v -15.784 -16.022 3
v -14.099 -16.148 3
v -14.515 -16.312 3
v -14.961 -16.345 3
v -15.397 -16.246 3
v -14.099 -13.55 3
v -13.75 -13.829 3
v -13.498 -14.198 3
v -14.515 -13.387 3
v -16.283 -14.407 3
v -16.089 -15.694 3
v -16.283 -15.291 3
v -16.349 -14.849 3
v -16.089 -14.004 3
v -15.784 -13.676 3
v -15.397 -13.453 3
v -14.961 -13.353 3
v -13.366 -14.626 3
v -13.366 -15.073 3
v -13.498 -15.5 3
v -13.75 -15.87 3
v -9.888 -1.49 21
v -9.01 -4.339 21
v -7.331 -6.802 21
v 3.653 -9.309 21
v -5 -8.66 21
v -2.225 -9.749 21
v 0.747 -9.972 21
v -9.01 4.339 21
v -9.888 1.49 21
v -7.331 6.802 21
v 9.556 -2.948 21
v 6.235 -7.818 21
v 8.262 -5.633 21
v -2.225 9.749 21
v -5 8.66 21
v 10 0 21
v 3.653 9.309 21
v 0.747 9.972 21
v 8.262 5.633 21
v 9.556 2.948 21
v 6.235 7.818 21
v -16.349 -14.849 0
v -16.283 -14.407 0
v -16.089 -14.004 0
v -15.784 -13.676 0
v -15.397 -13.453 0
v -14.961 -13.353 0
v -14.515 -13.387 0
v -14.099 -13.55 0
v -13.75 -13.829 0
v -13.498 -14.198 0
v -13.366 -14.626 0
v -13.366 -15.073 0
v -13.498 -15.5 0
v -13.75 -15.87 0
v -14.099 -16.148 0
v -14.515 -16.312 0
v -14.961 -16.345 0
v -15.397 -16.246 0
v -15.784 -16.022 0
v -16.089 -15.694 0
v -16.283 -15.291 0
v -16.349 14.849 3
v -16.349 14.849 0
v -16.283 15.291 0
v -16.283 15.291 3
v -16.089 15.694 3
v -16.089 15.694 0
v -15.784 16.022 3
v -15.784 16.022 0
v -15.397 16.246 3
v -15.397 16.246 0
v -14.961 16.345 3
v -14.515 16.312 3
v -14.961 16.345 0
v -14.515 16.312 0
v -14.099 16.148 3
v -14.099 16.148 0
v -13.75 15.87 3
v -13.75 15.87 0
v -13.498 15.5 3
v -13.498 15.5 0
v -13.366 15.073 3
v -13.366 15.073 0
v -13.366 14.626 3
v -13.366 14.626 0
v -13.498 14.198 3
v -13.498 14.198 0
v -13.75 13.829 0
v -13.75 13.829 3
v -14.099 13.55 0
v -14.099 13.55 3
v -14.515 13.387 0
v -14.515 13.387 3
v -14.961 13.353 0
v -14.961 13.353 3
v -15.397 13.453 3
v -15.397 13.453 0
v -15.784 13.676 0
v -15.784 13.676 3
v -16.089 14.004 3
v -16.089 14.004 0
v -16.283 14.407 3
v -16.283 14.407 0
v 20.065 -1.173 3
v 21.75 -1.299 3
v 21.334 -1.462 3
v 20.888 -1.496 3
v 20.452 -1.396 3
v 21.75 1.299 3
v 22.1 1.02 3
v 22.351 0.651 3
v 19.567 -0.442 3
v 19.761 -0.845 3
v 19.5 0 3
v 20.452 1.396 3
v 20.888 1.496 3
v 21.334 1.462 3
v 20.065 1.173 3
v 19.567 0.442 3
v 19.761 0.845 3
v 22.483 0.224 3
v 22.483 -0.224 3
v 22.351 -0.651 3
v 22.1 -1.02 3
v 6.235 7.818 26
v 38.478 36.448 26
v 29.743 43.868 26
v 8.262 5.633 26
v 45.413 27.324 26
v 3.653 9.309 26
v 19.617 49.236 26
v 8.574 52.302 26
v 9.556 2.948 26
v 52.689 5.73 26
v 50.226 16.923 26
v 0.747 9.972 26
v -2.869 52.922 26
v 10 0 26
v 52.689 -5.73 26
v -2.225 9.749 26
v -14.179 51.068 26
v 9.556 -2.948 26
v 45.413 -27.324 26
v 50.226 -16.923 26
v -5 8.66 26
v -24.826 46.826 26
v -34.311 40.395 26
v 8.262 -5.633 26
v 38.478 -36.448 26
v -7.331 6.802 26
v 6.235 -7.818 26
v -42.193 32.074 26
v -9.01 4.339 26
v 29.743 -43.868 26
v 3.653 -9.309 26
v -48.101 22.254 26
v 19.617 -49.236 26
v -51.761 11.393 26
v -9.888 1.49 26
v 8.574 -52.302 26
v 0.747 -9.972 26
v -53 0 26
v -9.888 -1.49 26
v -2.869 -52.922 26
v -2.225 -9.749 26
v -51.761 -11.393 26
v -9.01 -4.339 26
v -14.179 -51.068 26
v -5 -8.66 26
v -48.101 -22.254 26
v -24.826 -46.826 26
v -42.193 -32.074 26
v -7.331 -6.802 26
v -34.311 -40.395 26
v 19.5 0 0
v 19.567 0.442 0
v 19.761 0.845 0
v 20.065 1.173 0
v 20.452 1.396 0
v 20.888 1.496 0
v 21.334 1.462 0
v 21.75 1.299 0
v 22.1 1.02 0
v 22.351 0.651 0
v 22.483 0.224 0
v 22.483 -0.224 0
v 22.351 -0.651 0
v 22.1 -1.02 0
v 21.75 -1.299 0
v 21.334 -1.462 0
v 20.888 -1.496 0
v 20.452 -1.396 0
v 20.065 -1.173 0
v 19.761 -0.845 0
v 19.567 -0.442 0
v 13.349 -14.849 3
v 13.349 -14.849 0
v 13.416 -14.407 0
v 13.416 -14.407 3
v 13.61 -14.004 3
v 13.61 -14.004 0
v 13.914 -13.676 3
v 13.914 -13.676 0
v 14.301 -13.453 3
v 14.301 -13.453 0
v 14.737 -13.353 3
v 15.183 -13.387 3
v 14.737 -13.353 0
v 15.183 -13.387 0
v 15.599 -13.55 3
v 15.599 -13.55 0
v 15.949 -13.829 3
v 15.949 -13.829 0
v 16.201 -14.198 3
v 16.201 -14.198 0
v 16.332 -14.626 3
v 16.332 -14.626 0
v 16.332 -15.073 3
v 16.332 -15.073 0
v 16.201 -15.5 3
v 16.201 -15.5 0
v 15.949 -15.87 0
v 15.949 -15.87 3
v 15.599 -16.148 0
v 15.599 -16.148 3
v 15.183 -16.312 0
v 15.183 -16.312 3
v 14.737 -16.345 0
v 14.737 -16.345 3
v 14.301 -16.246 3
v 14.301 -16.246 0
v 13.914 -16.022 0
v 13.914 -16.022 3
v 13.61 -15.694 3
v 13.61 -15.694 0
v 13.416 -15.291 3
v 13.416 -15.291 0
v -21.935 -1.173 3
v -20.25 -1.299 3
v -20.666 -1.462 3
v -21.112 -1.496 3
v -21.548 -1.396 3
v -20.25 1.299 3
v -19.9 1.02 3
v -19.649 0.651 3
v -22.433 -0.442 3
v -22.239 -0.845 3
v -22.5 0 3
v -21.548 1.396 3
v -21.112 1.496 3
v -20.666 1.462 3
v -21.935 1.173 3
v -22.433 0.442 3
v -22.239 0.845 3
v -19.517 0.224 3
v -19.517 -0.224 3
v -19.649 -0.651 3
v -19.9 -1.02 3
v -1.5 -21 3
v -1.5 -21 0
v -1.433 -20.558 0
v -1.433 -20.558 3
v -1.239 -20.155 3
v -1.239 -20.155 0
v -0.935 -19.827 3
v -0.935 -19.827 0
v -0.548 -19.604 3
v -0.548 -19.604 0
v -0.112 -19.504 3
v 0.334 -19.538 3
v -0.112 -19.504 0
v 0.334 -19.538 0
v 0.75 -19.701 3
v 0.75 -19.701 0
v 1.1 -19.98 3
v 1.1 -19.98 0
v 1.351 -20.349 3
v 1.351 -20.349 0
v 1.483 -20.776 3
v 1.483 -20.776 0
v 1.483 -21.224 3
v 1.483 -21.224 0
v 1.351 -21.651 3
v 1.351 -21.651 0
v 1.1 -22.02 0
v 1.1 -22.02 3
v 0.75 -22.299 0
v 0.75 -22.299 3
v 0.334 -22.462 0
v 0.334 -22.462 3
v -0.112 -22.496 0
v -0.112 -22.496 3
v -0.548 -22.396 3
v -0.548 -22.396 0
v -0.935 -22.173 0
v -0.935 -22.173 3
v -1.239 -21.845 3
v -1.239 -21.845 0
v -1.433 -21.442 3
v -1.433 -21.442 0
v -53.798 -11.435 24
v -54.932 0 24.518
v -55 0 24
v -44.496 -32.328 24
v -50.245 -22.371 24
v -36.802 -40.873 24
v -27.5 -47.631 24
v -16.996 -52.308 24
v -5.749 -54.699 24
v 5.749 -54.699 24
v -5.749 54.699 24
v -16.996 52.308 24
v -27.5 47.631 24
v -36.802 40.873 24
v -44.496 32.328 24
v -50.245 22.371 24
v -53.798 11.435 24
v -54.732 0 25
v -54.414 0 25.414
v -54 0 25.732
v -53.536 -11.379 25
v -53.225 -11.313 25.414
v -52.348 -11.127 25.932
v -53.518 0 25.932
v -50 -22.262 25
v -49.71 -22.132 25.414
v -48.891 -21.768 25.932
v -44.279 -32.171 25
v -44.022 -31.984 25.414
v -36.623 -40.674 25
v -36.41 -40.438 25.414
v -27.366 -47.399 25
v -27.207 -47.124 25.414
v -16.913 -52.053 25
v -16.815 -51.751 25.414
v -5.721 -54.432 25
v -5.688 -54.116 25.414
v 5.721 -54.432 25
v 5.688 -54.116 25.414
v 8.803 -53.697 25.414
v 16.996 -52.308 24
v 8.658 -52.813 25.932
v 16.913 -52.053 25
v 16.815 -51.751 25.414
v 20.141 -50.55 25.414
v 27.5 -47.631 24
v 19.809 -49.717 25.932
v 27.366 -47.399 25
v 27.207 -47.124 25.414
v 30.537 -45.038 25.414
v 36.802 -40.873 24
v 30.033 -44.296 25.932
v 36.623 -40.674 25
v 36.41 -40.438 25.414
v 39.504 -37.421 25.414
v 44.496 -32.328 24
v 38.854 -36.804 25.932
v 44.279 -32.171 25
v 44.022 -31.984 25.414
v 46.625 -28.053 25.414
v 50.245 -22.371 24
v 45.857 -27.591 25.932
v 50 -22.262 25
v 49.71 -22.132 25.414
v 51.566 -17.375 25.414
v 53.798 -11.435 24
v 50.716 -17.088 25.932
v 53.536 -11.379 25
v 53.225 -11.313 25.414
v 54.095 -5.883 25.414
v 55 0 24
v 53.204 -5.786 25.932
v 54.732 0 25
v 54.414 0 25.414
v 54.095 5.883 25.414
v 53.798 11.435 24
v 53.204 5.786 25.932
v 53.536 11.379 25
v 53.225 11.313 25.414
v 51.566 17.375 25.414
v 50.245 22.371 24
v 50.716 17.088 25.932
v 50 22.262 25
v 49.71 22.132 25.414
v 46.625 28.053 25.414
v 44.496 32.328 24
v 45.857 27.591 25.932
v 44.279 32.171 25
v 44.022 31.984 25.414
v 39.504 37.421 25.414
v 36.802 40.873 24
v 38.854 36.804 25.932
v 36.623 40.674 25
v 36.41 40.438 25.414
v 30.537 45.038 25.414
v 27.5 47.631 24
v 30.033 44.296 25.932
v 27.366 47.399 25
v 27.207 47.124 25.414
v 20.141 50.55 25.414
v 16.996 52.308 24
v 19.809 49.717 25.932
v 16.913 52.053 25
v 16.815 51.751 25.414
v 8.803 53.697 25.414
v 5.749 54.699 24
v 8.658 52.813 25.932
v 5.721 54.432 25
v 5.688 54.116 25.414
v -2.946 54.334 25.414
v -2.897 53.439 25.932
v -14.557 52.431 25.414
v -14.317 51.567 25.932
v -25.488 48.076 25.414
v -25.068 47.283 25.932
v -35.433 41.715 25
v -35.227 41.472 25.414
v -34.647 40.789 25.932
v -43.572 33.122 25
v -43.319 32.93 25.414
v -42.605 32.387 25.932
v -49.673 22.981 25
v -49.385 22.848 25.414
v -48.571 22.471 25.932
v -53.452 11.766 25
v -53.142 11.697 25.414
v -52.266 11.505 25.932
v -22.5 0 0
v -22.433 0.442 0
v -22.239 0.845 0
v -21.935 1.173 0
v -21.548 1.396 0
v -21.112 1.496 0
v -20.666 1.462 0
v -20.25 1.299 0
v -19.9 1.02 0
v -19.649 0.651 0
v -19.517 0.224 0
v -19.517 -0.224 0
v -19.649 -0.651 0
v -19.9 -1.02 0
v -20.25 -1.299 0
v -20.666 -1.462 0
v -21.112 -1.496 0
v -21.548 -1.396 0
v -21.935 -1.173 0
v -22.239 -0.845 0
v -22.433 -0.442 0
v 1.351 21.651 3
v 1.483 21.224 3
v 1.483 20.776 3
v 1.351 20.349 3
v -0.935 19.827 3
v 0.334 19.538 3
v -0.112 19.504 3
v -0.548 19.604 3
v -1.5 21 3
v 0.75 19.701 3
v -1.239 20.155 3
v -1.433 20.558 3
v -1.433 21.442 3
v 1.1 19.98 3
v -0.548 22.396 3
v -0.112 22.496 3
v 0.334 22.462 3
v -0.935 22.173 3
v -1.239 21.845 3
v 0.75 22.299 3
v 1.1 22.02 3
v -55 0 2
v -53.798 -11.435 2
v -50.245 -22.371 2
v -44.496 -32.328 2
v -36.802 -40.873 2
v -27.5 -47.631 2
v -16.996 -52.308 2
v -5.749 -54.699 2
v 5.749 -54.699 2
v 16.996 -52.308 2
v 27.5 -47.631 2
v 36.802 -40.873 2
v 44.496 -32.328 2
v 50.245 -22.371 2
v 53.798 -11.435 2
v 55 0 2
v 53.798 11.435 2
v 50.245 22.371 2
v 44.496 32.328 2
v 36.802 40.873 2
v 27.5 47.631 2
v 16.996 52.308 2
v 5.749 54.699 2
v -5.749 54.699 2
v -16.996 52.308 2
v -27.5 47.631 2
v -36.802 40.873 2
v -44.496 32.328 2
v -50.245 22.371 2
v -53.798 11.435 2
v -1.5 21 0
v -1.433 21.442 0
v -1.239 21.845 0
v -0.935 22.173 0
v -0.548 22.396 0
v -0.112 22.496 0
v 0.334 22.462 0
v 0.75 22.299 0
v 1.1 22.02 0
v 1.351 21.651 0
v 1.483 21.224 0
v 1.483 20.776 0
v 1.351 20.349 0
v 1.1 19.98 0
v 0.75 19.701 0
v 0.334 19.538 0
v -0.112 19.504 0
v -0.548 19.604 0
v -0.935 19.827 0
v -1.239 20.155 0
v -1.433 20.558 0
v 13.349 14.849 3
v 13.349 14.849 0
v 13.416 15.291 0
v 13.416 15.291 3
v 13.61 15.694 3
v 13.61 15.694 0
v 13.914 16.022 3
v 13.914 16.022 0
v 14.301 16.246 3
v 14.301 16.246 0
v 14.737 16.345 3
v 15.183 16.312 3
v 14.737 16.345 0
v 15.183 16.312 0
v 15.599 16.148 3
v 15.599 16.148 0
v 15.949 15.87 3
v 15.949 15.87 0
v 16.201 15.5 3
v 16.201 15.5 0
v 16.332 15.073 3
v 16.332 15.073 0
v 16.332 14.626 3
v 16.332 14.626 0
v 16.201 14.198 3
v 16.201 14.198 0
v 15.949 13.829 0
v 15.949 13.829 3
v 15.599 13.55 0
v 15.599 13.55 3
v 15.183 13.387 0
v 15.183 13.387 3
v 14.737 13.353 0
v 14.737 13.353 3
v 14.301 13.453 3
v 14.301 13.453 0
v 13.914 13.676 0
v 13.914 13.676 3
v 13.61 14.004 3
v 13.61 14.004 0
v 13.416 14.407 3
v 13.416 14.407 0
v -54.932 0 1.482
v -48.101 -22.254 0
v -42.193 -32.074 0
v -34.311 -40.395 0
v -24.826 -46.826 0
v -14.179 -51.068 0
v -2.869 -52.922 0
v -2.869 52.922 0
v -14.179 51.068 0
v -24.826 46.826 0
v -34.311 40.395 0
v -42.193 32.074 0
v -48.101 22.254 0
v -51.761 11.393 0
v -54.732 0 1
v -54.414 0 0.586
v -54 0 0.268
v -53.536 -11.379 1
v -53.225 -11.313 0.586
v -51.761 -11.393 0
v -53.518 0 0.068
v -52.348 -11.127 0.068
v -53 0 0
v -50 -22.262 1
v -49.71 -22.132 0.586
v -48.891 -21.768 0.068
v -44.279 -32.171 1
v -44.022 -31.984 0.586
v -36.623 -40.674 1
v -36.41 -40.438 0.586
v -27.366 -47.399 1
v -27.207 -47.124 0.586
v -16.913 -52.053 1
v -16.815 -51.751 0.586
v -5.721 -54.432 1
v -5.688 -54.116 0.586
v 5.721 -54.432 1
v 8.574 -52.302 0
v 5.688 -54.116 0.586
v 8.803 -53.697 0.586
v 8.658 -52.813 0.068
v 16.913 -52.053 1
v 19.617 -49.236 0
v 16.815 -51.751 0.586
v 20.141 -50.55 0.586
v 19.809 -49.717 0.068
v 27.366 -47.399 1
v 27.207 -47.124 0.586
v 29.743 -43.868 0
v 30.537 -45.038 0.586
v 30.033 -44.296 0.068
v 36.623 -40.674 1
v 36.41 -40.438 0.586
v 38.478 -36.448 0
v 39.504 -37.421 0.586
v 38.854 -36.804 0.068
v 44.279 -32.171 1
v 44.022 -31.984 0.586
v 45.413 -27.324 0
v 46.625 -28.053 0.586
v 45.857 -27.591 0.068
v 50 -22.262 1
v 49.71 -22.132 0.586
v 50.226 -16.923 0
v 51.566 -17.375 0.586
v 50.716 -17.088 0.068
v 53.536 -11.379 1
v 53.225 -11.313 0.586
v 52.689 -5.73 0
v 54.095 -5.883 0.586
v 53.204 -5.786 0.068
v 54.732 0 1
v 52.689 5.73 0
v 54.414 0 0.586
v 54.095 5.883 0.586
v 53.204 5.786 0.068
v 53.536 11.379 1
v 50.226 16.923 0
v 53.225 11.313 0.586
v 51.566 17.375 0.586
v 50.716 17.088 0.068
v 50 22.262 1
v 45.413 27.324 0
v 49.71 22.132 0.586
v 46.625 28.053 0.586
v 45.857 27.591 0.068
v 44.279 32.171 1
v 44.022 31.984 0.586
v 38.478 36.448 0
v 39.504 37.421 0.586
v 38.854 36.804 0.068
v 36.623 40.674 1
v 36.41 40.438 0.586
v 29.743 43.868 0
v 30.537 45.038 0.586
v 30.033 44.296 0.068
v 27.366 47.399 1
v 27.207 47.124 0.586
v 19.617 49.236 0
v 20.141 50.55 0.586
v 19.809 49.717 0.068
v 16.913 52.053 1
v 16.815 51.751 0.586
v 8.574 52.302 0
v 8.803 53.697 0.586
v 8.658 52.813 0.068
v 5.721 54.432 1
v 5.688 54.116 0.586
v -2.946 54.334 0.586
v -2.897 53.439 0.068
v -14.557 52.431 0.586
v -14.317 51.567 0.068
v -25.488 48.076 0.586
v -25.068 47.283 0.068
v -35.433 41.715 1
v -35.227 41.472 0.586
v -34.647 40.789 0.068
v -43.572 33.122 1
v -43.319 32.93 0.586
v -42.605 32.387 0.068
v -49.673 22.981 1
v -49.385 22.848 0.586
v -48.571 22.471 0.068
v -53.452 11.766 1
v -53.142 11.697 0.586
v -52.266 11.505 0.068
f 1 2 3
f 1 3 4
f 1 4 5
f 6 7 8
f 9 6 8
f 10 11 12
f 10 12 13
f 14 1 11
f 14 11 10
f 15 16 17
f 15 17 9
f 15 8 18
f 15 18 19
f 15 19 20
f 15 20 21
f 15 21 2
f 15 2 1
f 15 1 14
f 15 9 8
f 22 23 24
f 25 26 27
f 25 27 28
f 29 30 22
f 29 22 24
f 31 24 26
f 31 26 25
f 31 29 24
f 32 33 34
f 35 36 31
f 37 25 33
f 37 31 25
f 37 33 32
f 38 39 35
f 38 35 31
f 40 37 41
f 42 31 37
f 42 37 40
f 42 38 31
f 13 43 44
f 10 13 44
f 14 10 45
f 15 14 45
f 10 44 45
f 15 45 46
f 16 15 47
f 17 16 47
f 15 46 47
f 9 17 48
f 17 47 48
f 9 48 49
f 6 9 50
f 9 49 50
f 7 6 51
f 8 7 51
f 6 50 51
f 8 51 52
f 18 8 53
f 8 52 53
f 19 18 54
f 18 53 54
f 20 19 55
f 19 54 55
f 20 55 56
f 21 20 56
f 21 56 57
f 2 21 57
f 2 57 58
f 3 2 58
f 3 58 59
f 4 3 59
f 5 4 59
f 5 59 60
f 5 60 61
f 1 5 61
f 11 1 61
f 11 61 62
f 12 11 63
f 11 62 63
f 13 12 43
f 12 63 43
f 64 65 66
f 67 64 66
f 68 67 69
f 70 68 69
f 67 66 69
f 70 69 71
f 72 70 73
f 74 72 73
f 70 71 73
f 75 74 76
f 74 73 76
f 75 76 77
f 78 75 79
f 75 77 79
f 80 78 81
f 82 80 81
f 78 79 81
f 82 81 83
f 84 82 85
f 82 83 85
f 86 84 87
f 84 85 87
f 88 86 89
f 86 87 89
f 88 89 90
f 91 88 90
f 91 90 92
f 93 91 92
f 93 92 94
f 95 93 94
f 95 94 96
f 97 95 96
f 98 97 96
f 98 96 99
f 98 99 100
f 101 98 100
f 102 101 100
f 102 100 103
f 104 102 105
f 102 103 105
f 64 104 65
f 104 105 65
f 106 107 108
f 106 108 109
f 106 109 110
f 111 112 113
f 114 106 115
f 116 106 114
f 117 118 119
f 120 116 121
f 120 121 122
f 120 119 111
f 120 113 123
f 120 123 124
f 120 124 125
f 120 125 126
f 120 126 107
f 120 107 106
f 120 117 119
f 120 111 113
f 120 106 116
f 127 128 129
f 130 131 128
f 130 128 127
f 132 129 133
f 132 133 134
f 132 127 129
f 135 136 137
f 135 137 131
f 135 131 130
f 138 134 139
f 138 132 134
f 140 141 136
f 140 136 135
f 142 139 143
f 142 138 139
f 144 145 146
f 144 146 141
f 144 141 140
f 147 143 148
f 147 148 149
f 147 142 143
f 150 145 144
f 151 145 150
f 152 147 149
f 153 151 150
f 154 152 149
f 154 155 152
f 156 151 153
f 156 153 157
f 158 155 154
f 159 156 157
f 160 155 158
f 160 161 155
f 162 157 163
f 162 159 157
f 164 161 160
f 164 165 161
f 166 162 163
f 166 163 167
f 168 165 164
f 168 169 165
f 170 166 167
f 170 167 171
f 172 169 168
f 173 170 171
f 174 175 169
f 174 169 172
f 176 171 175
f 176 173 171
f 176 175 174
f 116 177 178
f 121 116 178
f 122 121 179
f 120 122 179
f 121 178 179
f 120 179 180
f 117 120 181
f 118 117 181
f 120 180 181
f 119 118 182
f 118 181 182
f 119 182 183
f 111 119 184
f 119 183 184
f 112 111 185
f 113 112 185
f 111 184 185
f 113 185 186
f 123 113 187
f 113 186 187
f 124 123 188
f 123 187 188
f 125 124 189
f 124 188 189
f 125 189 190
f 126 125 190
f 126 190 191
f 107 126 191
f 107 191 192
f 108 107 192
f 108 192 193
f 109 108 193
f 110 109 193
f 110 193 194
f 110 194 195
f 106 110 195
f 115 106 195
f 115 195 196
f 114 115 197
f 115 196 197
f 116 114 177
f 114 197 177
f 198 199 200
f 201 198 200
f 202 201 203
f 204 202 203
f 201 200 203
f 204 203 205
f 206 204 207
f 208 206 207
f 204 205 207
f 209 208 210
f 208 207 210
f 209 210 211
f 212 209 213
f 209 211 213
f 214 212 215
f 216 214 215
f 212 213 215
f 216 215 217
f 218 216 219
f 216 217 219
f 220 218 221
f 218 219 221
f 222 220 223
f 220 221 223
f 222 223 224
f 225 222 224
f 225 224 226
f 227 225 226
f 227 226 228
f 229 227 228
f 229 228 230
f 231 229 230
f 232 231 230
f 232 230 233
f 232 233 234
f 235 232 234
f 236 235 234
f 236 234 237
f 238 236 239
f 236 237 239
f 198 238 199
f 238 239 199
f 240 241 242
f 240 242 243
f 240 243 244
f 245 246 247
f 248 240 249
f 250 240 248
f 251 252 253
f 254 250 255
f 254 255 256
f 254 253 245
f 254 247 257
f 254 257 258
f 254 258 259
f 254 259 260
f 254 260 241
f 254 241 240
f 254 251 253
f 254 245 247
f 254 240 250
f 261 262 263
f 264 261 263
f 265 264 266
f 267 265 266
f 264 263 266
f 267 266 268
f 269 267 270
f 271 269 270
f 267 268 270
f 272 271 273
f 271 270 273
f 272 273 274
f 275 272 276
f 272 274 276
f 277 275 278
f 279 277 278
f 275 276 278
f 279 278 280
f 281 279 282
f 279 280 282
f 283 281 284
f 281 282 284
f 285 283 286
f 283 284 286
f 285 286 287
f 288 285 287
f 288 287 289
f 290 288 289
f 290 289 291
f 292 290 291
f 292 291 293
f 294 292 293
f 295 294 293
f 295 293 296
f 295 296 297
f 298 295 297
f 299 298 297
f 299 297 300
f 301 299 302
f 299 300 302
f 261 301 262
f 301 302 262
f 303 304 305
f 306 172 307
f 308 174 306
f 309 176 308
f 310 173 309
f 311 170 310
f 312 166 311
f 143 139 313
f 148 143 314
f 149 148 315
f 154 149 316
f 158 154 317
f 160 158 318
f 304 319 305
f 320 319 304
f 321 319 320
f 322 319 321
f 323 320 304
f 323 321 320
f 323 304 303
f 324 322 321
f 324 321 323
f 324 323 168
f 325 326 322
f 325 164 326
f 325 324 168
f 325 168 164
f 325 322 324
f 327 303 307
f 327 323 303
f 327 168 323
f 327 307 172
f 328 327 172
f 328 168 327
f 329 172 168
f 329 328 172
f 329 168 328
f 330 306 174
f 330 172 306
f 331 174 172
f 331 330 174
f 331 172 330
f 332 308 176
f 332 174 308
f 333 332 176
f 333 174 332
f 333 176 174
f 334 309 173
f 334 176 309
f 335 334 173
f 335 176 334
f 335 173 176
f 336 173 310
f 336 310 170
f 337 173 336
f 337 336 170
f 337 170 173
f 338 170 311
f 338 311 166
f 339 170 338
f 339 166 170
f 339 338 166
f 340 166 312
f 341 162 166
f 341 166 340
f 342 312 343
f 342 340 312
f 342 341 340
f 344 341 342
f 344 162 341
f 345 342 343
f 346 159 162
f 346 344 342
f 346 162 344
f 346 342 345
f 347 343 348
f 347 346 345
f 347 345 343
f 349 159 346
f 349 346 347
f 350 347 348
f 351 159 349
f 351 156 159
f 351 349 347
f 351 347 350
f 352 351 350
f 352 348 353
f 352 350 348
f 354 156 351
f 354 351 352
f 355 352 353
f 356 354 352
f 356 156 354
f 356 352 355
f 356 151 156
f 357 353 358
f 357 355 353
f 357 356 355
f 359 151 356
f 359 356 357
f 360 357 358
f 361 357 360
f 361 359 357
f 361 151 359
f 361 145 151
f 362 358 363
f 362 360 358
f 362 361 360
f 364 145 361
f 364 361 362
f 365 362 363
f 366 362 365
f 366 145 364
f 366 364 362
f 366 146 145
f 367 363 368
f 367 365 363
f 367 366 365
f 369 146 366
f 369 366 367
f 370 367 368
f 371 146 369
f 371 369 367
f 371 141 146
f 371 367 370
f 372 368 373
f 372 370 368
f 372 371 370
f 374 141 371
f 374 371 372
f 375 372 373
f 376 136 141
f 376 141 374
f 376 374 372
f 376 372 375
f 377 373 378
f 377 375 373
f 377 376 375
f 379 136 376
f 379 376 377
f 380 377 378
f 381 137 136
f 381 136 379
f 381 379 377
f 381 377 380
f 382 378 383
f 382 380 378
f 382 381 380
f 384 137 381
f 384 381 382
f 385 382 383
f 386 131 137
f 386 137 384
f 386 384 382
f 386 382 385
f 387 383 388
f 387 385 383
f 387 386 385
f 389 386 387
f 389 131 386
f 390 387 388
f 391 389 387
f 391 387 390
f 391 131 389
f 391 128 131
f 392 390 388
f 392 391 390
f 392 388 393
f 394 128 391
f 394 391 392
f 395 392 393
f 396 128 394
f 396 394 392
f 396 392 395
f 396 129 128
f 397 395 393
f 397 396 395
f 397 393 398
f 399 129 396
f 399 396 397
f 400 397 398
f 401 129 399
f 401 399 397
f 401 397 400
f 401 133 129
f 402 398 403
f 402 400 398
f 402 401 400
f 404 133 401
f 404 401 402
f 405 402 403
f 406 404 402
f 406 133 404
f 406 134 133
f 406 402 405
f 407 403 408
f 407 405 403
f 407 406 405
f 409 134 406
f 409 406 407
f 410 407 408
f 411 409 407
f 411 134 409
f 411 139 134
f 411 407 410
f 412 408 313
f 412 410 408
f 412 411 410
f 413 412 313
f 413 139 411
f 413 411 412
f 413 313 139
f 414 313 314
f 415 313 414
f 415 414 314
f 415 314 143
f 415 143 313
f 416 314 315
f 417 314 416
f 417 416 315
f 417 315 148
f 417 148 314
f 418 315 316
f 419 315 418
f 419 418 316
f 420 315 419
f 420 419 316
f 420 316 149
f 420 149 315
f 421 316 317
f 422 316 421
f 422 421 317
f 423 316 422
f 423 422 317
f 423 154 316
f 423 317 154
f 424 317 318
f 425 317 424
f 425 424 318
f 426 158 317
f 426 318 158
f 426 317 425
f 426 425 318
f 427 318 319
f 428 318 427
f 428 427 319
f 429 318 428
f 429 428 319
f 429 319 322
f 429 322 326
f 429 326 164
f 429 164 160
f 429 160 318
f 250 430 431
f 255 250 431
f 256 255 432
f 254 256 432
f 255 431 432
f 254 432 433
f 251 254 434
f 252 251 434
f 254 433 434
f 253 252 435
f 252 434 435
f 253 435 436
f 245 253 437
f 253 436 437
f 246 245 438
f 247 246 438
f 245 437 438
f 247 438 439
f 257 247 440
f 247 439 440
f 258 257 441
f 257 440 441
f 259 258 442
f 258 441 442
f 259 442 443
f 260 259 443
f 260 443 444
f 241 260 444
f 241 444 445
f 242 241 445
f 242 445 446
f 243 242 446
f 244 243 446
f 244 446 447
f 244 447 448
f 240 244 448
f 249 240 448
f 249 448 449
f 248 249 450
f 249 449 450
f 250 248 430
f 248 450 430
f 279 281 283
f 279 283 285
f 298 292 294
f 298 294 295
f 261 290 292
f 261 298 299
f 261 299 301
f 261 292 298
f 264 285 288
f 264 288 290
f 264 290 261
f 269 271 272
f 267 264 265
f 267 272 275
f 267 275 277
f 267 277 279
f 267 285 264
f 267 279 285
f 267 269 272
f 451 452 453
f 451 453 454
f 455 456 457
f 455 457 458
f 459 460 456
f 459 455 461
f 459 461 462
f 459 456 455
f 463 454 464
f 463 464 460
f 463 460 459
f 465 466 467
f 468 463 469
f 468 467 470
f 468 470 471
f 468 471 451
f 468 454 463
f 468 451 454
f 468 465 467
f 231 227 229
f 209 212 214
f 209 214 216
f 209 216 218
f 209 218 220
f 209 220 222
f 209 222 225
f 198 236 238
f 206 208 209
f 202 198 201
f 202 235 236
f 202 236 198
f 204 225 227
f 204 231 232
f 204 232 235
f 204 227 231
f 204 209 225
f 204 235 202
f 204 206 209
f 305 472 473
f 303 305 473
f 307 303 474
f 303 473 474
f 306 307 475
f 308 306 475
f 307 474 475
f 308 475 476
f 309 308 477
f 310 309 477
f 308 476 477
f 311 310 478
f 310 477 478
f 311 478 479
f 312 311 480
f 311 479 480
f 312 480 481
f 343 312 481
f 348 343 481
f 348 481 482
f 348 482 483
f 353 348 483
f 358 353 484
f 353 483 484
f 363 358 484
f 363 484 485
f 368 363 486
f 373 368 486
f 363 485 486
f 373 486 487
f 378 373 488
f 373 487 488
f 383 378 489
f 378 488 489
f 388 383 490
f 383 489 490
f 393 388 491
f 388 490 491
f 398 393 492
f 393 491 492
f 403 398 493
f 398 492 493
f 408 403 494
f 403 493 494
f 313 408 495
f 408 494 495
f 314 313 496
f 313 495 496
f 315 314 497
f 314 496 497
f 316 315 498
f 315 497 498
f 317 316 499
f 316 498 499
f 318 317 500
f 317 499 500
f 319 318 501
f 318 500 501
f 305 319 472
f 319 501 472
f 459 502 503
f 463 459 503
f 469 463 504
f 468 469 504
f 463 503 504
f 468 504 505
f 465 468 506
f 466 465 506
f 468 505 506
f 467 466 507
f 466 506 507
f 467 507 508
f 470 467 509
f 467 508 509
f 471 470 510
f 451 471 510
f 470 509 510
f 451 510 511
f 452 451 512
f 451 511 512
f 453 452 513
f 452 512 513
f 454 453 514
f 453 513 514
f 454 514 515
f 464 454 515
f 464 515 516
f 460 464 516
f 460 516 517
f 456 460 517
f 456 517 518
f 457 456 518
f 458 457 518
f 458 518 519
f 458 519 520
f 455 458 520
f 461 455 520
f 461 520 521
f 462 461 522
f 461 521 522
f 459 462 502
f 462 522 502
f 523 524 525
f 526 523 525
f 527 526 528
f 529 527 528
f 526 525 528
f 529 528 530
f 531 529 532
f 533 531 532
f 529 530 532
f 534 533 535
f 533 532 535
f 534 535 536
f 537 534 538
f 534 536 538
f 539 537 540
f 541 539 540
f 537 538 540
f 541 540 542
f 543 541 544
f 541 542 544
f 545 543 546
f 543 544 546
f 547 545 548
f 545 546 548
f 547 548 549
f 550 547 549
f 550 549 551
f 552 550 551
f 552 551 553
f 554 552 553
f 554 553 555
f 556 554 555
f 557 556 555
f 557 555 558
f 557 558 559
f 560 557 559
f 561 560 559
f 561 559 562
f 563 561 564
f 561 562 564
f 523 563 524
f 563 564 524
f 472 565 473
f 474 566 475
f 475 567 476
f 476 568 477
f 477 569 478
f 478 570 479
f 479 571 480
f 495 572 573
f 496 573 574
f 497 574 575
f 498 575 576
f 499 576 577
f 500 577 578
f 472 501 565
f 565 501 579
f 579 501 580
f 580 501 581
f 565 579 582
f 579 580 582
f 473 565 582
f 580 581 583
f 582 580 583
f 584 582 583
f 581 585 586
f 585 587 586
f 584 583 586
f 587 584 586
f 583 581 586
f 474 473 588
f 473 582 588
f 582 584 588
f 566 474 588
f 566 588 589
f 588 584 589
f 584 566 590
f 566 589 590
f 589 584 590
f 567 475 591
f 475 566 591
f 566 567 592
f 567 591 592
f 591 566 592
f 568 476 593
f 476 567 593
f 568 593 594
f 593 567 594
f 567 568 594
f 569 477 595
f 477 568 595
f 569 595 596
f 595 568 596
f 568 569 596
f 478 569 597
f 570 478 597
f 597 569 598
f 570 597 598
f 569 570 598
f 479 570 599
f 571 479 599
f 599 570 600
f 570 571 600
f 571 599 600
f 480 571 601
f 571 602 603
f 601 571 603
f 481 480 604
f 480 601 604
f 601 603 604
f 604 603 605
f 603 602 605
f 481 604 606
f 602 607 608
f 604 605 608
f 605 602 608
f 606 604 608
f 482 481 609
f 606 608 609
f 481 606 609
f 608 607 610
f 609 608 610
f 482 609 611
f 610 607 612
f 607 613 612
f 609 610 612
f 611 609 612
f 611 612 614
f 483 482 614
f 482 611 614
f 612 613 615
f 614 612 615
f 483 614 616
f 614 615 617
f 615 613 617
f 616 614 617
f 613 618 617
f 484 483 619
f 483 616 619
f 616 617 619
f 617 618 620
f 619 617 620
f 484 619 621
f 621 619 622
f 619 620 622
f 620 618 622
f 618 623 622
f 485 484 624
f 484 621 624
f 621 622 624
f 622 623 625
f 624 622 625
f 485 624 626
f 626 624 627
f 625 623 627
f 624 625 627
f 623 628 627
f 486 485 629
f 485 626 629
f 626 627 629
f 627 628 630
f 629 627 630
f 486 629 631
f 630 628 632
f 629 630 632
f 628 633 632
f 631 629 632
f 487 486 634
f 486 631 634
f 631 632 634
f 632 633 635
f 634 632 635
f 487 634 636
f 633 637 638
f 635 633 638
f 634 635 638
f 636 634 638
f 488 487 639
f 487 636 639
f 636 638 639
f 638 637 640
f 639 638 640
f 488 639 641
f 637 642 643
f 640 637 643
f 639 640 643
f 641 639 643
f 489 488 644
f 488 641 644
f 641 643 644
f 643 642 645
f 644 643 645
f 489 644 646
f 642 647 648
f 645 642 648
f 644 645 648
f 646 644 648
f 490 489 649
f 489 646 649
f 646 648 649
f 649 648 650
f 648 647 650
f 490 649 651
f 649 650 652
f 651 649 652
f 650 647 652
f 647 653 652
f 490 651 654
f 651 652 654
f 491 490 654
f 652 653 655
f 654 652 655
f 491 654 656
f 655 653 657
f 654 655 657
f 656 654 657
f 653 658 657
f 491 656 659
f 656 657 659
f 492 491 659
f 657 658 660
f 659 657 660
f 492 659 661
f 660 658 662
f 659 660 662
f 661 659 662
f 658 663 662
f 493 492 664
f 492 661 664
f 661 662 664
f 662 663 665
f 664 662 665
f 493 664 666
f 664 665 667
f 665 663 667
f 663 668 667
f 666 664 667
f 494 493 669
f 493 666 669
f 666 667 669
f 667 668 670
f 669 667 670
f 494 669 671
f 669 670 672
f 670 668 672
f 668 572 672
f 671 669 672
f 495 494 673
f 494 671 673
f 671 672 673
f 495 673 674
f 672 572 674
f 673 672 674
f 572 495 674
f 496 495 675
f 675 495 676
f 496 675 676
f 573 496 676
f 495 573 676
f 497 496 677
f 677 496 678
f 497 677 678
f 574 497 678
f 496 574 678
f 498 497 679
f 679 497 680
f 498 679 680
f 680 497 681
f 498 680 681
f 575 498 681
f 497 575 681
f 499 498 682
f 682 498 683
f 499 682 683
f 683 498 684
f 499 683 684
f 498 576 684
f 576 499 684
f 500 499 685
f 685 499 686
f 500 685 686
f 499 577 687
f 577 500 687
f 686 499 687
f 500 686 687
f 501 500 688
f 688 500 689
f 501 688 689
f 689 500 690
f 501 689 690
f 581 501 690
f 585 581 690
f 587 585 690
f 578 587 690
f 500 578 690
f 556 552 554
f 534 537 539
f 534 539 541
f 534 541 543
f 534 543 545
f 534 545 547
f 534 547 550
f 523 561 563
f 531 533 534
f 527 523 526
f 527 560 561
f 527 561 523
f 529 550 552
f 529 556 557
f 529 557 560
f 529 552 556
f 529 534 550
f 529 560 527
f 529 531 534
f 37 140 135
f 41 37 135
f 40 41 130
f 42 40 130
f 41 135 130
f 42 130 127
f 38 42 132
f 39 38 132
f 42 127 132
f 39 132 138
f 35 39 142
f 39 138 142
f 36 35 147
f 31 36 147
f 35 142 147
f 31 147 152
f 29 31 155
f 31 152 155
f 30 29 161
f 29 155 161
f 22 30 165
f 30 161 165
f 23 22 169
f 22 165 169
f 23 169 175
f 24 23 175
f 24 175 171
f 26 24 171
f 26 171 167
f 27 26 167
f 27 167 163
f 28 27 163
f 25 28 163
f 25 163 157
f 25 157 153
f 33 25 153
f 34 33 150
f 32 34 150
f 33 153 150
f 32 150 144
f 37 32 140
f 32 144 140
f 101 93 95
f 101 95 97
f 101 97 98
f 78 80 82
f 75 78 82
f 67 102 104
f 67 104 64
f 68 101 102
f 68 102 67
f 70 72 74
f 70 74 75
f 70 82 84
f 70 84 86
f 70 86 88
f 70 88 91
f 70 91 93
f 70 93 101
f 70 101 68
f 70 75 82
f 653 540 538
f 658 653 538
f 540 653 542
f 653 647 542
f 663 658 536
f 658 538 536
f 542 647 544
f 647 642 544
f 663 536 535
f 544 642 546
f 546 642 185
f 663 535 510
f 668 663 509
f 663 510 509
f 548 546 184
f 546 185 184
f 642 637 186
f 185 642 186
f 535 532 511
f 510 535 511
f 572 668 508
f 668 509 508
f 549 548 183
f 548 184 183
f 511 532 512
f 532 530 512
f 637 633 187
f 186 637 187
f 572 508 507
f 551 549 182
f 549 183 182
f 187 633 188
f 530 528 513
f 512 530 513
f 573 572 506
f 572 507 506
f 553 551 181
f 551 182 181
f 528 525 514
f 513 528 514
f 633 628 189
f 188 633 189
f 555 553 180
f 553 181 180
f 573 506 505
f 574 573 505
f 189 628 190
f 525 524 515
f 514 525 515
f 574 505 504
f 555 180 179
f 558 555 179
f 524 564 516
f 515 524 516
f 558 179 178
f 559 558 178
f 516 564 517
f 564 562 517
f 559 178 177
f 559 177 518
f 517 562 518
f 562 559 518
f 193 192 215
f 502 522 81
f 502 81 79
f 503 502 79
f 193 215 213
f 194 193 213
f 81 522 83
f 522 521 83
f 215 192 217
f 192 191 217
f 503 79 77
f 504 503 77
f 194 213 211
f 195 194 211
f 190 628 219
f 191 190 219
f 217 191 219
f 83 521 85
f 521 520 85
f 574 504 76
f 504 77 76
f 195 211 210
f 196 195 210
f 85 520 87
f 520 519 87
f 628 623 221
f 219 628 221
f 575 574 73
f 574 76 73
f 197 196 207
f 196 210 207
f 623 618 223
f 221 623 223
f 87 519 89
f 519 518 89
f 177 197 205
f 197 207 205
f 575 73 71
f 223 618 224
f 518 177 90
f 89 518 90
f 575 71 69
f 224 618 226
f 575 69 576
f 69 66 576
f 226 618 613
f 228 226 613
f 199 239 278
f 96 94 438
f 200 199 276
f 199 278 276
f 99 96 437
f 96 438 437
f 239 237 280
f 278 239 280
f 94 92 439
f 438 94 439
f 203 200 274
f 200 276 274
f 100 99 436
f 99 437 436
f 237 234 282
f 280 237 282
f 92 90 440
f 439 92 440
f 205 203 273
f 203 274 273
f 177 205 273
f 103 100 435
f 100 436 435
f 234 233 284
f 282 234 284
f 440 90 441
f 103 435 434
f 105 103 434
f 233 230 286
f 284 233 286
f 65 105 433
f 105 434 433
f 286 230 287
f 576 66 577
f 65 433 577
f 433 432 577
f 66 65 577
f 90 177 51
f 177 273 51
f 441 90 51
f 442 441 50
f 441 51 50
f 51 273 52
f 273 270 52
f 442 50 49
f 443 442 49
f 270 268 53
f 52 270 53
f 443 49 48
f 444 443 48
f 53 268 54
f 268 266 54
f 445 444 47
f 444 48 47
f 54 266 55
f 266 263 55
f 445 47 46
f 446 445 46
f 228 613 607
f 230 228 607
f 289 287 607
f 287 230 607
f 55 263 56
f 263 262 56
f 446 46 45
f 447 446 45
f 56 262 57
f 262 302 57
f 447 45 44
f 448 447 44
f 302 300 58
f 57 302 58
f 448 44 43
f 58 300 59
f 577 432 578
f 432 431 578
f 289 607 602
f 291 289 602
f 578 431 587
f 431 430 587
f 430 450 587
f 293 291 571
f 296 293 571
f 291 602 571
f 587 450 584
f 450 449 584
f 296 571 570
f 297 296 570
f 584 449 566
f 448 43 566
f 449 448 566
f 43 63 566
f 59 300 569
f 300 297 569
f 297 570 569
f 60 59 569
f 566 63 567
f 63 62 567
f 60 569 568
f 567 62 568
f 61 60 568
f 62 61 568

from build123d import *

# Parameters (mm, degrees)
SKETCH1_R           = 55
BOSS_EXTRUDE1_DEPTH = 26
SKETCH2_R           = 1.5
CUT_EXTRUDE1_DEPTH  = 3
SKETCH3_R           = 32.5
BOSS_EXTRUDE2_DEPTH = 8
SKETCH4_R           = 2.55
SKETCH4_R_2         = 1.55
SKETCH4_R_3         = 2.05
CUT_EXTRUDE2_DEPTH  = 3
FILLET1_R           = 2
SKETCH9_R           = 42.415927499
CUT_EXTRUDE3_DEPTH  = 83.012194282
SKETCH10_R          = 10
CUT_EXTRUDE4_DEPTH  = 5


with BuildPart() as part:
    # Sketch1 → Boss-Extrude1 (new body)
    with BuildSketch(Plane.XY):
        with Locations(Location((0, 0, 0), (0, 0, 180))):
            Circle(SKETCH1_R)
    extrude(amount=BOSS_EXTRUDE1_DEPTH)

    # Sketch2 → Cut-Extrude1 (cut)
    with BuildSketch(Plane(origin=(0, 0, 0), x_dir=(-1, 0, 0), z_dir=(0, 0, -1))):
        with Locations((0, -21)):
            Circle(SKETCH2_R)
        with Locations((-14.849242405, -14.849242405)):
            Circle(SKETCH2_R)
        with Locations((-21, 0)):
            Circle(SKETCH2_R)
        with Locations((-14.849242405, 14.849242405)):
            Circle(SKETCH2_R)
        with Locations((0, 21)):
            Circle(SKETCH2_R)
        with Locations((14.849242405, 14.849242405)):
            Circle(SKETCH2_R)
        with Locations((21, 0)):
            Circle(SKETCH2_R)
        with Locations((14.849242405, -14.849242405)):
            Circle(SKETCH2_R)
    extrude(amount=-CUT_EXTRUDE1_DEPTH, mode=Mode.SUBTRACT)

    # Sketch3 → Boss-Extrude2 (add)
    with BuildSketch(Plane.XY.offset(26)):
        Circle(SKETCH3_R)
    extrude(amount=BOSS_EXTRUDE2_DEPTH)

    # Sketch4 → Cut-Extrude2 (cut)
    with BuildSketch(Plane.XY.offset(34)):
        with Locations((-16.5, 0)):
            Circle(SKETCH4_R)
        with Locations((0, -16.5)):
            Circle(SKETCH4_R)
        with Locations((16.5, 0)):
            Circle(SKETCH4_R)
        with Locations((0, 16.5)):
            Circle(SKETCH4_R)
        with Locations((0, 26)):
            Circle(SKETCH4_R_2)
        with Locations((0, 22)):
            Circle(SKETCH4_R_2)
        with Locations((-11.66726189, -11.66726189)):
            Circle(SKETCH4_R_3)
        with Locations((11.66726189, -11.66726189)):
            Circle(SKETCH4_R_3)
        with Locations((11.66726189, 11.66726189)):
            Circle(SKETCH4_R_3)
        with Locations((-11.66726189, 11.66726189)):
            Circle(SKETCH4_R_3)
        with Locations((-22, 0)):
            Circle(SKETCH4_R_2)
        with Locations((-26, 0)):
            Circle(SKETCH4_R_2)
        with Locations((0, -22)):
            Circle(SKETCH4_R_2)
        with Locations((0, -26)):
            Circle(SKETCH4_R_2)
        with Locations((22, 0)):
            Circle(SKETCH4_R_2)
        with Locations((26, 0)):
            Circle(SKETCH4_R_2)
    extrude(amount=-CUT_EXTRUDE2_DEPTH, mode=Mode.SUBTRACT)

    # Fillet1
    fillet1_edges = [part.edges().sort_by_distance(p)[0] for p in [
        (55, 0, 0),
        (55, 0, 26),
    ]]
    fillet(fillet1_edges, radius=FILLET1_R)

    # Sketch9 → Cut-Extrude3 (cut, through all)
    with BuildSketch(Plane.XY.offset(26)):
        Circle(SKETCH9_R)
    extrude(amount=CUT_EXTRUDE3_DEPTH, mode=Mode.SUBTRACT)

    # Sketch10 → Cut-Extrude4 (cut)
    with BuildSketch(Plane.XY.offset(26)):
        Circle(SKETCH10_R)
    extrude(amount=-CUT_EXTRUDE4_DEPTH, mode=Mode.SUBTRACT)


solid = part.part
